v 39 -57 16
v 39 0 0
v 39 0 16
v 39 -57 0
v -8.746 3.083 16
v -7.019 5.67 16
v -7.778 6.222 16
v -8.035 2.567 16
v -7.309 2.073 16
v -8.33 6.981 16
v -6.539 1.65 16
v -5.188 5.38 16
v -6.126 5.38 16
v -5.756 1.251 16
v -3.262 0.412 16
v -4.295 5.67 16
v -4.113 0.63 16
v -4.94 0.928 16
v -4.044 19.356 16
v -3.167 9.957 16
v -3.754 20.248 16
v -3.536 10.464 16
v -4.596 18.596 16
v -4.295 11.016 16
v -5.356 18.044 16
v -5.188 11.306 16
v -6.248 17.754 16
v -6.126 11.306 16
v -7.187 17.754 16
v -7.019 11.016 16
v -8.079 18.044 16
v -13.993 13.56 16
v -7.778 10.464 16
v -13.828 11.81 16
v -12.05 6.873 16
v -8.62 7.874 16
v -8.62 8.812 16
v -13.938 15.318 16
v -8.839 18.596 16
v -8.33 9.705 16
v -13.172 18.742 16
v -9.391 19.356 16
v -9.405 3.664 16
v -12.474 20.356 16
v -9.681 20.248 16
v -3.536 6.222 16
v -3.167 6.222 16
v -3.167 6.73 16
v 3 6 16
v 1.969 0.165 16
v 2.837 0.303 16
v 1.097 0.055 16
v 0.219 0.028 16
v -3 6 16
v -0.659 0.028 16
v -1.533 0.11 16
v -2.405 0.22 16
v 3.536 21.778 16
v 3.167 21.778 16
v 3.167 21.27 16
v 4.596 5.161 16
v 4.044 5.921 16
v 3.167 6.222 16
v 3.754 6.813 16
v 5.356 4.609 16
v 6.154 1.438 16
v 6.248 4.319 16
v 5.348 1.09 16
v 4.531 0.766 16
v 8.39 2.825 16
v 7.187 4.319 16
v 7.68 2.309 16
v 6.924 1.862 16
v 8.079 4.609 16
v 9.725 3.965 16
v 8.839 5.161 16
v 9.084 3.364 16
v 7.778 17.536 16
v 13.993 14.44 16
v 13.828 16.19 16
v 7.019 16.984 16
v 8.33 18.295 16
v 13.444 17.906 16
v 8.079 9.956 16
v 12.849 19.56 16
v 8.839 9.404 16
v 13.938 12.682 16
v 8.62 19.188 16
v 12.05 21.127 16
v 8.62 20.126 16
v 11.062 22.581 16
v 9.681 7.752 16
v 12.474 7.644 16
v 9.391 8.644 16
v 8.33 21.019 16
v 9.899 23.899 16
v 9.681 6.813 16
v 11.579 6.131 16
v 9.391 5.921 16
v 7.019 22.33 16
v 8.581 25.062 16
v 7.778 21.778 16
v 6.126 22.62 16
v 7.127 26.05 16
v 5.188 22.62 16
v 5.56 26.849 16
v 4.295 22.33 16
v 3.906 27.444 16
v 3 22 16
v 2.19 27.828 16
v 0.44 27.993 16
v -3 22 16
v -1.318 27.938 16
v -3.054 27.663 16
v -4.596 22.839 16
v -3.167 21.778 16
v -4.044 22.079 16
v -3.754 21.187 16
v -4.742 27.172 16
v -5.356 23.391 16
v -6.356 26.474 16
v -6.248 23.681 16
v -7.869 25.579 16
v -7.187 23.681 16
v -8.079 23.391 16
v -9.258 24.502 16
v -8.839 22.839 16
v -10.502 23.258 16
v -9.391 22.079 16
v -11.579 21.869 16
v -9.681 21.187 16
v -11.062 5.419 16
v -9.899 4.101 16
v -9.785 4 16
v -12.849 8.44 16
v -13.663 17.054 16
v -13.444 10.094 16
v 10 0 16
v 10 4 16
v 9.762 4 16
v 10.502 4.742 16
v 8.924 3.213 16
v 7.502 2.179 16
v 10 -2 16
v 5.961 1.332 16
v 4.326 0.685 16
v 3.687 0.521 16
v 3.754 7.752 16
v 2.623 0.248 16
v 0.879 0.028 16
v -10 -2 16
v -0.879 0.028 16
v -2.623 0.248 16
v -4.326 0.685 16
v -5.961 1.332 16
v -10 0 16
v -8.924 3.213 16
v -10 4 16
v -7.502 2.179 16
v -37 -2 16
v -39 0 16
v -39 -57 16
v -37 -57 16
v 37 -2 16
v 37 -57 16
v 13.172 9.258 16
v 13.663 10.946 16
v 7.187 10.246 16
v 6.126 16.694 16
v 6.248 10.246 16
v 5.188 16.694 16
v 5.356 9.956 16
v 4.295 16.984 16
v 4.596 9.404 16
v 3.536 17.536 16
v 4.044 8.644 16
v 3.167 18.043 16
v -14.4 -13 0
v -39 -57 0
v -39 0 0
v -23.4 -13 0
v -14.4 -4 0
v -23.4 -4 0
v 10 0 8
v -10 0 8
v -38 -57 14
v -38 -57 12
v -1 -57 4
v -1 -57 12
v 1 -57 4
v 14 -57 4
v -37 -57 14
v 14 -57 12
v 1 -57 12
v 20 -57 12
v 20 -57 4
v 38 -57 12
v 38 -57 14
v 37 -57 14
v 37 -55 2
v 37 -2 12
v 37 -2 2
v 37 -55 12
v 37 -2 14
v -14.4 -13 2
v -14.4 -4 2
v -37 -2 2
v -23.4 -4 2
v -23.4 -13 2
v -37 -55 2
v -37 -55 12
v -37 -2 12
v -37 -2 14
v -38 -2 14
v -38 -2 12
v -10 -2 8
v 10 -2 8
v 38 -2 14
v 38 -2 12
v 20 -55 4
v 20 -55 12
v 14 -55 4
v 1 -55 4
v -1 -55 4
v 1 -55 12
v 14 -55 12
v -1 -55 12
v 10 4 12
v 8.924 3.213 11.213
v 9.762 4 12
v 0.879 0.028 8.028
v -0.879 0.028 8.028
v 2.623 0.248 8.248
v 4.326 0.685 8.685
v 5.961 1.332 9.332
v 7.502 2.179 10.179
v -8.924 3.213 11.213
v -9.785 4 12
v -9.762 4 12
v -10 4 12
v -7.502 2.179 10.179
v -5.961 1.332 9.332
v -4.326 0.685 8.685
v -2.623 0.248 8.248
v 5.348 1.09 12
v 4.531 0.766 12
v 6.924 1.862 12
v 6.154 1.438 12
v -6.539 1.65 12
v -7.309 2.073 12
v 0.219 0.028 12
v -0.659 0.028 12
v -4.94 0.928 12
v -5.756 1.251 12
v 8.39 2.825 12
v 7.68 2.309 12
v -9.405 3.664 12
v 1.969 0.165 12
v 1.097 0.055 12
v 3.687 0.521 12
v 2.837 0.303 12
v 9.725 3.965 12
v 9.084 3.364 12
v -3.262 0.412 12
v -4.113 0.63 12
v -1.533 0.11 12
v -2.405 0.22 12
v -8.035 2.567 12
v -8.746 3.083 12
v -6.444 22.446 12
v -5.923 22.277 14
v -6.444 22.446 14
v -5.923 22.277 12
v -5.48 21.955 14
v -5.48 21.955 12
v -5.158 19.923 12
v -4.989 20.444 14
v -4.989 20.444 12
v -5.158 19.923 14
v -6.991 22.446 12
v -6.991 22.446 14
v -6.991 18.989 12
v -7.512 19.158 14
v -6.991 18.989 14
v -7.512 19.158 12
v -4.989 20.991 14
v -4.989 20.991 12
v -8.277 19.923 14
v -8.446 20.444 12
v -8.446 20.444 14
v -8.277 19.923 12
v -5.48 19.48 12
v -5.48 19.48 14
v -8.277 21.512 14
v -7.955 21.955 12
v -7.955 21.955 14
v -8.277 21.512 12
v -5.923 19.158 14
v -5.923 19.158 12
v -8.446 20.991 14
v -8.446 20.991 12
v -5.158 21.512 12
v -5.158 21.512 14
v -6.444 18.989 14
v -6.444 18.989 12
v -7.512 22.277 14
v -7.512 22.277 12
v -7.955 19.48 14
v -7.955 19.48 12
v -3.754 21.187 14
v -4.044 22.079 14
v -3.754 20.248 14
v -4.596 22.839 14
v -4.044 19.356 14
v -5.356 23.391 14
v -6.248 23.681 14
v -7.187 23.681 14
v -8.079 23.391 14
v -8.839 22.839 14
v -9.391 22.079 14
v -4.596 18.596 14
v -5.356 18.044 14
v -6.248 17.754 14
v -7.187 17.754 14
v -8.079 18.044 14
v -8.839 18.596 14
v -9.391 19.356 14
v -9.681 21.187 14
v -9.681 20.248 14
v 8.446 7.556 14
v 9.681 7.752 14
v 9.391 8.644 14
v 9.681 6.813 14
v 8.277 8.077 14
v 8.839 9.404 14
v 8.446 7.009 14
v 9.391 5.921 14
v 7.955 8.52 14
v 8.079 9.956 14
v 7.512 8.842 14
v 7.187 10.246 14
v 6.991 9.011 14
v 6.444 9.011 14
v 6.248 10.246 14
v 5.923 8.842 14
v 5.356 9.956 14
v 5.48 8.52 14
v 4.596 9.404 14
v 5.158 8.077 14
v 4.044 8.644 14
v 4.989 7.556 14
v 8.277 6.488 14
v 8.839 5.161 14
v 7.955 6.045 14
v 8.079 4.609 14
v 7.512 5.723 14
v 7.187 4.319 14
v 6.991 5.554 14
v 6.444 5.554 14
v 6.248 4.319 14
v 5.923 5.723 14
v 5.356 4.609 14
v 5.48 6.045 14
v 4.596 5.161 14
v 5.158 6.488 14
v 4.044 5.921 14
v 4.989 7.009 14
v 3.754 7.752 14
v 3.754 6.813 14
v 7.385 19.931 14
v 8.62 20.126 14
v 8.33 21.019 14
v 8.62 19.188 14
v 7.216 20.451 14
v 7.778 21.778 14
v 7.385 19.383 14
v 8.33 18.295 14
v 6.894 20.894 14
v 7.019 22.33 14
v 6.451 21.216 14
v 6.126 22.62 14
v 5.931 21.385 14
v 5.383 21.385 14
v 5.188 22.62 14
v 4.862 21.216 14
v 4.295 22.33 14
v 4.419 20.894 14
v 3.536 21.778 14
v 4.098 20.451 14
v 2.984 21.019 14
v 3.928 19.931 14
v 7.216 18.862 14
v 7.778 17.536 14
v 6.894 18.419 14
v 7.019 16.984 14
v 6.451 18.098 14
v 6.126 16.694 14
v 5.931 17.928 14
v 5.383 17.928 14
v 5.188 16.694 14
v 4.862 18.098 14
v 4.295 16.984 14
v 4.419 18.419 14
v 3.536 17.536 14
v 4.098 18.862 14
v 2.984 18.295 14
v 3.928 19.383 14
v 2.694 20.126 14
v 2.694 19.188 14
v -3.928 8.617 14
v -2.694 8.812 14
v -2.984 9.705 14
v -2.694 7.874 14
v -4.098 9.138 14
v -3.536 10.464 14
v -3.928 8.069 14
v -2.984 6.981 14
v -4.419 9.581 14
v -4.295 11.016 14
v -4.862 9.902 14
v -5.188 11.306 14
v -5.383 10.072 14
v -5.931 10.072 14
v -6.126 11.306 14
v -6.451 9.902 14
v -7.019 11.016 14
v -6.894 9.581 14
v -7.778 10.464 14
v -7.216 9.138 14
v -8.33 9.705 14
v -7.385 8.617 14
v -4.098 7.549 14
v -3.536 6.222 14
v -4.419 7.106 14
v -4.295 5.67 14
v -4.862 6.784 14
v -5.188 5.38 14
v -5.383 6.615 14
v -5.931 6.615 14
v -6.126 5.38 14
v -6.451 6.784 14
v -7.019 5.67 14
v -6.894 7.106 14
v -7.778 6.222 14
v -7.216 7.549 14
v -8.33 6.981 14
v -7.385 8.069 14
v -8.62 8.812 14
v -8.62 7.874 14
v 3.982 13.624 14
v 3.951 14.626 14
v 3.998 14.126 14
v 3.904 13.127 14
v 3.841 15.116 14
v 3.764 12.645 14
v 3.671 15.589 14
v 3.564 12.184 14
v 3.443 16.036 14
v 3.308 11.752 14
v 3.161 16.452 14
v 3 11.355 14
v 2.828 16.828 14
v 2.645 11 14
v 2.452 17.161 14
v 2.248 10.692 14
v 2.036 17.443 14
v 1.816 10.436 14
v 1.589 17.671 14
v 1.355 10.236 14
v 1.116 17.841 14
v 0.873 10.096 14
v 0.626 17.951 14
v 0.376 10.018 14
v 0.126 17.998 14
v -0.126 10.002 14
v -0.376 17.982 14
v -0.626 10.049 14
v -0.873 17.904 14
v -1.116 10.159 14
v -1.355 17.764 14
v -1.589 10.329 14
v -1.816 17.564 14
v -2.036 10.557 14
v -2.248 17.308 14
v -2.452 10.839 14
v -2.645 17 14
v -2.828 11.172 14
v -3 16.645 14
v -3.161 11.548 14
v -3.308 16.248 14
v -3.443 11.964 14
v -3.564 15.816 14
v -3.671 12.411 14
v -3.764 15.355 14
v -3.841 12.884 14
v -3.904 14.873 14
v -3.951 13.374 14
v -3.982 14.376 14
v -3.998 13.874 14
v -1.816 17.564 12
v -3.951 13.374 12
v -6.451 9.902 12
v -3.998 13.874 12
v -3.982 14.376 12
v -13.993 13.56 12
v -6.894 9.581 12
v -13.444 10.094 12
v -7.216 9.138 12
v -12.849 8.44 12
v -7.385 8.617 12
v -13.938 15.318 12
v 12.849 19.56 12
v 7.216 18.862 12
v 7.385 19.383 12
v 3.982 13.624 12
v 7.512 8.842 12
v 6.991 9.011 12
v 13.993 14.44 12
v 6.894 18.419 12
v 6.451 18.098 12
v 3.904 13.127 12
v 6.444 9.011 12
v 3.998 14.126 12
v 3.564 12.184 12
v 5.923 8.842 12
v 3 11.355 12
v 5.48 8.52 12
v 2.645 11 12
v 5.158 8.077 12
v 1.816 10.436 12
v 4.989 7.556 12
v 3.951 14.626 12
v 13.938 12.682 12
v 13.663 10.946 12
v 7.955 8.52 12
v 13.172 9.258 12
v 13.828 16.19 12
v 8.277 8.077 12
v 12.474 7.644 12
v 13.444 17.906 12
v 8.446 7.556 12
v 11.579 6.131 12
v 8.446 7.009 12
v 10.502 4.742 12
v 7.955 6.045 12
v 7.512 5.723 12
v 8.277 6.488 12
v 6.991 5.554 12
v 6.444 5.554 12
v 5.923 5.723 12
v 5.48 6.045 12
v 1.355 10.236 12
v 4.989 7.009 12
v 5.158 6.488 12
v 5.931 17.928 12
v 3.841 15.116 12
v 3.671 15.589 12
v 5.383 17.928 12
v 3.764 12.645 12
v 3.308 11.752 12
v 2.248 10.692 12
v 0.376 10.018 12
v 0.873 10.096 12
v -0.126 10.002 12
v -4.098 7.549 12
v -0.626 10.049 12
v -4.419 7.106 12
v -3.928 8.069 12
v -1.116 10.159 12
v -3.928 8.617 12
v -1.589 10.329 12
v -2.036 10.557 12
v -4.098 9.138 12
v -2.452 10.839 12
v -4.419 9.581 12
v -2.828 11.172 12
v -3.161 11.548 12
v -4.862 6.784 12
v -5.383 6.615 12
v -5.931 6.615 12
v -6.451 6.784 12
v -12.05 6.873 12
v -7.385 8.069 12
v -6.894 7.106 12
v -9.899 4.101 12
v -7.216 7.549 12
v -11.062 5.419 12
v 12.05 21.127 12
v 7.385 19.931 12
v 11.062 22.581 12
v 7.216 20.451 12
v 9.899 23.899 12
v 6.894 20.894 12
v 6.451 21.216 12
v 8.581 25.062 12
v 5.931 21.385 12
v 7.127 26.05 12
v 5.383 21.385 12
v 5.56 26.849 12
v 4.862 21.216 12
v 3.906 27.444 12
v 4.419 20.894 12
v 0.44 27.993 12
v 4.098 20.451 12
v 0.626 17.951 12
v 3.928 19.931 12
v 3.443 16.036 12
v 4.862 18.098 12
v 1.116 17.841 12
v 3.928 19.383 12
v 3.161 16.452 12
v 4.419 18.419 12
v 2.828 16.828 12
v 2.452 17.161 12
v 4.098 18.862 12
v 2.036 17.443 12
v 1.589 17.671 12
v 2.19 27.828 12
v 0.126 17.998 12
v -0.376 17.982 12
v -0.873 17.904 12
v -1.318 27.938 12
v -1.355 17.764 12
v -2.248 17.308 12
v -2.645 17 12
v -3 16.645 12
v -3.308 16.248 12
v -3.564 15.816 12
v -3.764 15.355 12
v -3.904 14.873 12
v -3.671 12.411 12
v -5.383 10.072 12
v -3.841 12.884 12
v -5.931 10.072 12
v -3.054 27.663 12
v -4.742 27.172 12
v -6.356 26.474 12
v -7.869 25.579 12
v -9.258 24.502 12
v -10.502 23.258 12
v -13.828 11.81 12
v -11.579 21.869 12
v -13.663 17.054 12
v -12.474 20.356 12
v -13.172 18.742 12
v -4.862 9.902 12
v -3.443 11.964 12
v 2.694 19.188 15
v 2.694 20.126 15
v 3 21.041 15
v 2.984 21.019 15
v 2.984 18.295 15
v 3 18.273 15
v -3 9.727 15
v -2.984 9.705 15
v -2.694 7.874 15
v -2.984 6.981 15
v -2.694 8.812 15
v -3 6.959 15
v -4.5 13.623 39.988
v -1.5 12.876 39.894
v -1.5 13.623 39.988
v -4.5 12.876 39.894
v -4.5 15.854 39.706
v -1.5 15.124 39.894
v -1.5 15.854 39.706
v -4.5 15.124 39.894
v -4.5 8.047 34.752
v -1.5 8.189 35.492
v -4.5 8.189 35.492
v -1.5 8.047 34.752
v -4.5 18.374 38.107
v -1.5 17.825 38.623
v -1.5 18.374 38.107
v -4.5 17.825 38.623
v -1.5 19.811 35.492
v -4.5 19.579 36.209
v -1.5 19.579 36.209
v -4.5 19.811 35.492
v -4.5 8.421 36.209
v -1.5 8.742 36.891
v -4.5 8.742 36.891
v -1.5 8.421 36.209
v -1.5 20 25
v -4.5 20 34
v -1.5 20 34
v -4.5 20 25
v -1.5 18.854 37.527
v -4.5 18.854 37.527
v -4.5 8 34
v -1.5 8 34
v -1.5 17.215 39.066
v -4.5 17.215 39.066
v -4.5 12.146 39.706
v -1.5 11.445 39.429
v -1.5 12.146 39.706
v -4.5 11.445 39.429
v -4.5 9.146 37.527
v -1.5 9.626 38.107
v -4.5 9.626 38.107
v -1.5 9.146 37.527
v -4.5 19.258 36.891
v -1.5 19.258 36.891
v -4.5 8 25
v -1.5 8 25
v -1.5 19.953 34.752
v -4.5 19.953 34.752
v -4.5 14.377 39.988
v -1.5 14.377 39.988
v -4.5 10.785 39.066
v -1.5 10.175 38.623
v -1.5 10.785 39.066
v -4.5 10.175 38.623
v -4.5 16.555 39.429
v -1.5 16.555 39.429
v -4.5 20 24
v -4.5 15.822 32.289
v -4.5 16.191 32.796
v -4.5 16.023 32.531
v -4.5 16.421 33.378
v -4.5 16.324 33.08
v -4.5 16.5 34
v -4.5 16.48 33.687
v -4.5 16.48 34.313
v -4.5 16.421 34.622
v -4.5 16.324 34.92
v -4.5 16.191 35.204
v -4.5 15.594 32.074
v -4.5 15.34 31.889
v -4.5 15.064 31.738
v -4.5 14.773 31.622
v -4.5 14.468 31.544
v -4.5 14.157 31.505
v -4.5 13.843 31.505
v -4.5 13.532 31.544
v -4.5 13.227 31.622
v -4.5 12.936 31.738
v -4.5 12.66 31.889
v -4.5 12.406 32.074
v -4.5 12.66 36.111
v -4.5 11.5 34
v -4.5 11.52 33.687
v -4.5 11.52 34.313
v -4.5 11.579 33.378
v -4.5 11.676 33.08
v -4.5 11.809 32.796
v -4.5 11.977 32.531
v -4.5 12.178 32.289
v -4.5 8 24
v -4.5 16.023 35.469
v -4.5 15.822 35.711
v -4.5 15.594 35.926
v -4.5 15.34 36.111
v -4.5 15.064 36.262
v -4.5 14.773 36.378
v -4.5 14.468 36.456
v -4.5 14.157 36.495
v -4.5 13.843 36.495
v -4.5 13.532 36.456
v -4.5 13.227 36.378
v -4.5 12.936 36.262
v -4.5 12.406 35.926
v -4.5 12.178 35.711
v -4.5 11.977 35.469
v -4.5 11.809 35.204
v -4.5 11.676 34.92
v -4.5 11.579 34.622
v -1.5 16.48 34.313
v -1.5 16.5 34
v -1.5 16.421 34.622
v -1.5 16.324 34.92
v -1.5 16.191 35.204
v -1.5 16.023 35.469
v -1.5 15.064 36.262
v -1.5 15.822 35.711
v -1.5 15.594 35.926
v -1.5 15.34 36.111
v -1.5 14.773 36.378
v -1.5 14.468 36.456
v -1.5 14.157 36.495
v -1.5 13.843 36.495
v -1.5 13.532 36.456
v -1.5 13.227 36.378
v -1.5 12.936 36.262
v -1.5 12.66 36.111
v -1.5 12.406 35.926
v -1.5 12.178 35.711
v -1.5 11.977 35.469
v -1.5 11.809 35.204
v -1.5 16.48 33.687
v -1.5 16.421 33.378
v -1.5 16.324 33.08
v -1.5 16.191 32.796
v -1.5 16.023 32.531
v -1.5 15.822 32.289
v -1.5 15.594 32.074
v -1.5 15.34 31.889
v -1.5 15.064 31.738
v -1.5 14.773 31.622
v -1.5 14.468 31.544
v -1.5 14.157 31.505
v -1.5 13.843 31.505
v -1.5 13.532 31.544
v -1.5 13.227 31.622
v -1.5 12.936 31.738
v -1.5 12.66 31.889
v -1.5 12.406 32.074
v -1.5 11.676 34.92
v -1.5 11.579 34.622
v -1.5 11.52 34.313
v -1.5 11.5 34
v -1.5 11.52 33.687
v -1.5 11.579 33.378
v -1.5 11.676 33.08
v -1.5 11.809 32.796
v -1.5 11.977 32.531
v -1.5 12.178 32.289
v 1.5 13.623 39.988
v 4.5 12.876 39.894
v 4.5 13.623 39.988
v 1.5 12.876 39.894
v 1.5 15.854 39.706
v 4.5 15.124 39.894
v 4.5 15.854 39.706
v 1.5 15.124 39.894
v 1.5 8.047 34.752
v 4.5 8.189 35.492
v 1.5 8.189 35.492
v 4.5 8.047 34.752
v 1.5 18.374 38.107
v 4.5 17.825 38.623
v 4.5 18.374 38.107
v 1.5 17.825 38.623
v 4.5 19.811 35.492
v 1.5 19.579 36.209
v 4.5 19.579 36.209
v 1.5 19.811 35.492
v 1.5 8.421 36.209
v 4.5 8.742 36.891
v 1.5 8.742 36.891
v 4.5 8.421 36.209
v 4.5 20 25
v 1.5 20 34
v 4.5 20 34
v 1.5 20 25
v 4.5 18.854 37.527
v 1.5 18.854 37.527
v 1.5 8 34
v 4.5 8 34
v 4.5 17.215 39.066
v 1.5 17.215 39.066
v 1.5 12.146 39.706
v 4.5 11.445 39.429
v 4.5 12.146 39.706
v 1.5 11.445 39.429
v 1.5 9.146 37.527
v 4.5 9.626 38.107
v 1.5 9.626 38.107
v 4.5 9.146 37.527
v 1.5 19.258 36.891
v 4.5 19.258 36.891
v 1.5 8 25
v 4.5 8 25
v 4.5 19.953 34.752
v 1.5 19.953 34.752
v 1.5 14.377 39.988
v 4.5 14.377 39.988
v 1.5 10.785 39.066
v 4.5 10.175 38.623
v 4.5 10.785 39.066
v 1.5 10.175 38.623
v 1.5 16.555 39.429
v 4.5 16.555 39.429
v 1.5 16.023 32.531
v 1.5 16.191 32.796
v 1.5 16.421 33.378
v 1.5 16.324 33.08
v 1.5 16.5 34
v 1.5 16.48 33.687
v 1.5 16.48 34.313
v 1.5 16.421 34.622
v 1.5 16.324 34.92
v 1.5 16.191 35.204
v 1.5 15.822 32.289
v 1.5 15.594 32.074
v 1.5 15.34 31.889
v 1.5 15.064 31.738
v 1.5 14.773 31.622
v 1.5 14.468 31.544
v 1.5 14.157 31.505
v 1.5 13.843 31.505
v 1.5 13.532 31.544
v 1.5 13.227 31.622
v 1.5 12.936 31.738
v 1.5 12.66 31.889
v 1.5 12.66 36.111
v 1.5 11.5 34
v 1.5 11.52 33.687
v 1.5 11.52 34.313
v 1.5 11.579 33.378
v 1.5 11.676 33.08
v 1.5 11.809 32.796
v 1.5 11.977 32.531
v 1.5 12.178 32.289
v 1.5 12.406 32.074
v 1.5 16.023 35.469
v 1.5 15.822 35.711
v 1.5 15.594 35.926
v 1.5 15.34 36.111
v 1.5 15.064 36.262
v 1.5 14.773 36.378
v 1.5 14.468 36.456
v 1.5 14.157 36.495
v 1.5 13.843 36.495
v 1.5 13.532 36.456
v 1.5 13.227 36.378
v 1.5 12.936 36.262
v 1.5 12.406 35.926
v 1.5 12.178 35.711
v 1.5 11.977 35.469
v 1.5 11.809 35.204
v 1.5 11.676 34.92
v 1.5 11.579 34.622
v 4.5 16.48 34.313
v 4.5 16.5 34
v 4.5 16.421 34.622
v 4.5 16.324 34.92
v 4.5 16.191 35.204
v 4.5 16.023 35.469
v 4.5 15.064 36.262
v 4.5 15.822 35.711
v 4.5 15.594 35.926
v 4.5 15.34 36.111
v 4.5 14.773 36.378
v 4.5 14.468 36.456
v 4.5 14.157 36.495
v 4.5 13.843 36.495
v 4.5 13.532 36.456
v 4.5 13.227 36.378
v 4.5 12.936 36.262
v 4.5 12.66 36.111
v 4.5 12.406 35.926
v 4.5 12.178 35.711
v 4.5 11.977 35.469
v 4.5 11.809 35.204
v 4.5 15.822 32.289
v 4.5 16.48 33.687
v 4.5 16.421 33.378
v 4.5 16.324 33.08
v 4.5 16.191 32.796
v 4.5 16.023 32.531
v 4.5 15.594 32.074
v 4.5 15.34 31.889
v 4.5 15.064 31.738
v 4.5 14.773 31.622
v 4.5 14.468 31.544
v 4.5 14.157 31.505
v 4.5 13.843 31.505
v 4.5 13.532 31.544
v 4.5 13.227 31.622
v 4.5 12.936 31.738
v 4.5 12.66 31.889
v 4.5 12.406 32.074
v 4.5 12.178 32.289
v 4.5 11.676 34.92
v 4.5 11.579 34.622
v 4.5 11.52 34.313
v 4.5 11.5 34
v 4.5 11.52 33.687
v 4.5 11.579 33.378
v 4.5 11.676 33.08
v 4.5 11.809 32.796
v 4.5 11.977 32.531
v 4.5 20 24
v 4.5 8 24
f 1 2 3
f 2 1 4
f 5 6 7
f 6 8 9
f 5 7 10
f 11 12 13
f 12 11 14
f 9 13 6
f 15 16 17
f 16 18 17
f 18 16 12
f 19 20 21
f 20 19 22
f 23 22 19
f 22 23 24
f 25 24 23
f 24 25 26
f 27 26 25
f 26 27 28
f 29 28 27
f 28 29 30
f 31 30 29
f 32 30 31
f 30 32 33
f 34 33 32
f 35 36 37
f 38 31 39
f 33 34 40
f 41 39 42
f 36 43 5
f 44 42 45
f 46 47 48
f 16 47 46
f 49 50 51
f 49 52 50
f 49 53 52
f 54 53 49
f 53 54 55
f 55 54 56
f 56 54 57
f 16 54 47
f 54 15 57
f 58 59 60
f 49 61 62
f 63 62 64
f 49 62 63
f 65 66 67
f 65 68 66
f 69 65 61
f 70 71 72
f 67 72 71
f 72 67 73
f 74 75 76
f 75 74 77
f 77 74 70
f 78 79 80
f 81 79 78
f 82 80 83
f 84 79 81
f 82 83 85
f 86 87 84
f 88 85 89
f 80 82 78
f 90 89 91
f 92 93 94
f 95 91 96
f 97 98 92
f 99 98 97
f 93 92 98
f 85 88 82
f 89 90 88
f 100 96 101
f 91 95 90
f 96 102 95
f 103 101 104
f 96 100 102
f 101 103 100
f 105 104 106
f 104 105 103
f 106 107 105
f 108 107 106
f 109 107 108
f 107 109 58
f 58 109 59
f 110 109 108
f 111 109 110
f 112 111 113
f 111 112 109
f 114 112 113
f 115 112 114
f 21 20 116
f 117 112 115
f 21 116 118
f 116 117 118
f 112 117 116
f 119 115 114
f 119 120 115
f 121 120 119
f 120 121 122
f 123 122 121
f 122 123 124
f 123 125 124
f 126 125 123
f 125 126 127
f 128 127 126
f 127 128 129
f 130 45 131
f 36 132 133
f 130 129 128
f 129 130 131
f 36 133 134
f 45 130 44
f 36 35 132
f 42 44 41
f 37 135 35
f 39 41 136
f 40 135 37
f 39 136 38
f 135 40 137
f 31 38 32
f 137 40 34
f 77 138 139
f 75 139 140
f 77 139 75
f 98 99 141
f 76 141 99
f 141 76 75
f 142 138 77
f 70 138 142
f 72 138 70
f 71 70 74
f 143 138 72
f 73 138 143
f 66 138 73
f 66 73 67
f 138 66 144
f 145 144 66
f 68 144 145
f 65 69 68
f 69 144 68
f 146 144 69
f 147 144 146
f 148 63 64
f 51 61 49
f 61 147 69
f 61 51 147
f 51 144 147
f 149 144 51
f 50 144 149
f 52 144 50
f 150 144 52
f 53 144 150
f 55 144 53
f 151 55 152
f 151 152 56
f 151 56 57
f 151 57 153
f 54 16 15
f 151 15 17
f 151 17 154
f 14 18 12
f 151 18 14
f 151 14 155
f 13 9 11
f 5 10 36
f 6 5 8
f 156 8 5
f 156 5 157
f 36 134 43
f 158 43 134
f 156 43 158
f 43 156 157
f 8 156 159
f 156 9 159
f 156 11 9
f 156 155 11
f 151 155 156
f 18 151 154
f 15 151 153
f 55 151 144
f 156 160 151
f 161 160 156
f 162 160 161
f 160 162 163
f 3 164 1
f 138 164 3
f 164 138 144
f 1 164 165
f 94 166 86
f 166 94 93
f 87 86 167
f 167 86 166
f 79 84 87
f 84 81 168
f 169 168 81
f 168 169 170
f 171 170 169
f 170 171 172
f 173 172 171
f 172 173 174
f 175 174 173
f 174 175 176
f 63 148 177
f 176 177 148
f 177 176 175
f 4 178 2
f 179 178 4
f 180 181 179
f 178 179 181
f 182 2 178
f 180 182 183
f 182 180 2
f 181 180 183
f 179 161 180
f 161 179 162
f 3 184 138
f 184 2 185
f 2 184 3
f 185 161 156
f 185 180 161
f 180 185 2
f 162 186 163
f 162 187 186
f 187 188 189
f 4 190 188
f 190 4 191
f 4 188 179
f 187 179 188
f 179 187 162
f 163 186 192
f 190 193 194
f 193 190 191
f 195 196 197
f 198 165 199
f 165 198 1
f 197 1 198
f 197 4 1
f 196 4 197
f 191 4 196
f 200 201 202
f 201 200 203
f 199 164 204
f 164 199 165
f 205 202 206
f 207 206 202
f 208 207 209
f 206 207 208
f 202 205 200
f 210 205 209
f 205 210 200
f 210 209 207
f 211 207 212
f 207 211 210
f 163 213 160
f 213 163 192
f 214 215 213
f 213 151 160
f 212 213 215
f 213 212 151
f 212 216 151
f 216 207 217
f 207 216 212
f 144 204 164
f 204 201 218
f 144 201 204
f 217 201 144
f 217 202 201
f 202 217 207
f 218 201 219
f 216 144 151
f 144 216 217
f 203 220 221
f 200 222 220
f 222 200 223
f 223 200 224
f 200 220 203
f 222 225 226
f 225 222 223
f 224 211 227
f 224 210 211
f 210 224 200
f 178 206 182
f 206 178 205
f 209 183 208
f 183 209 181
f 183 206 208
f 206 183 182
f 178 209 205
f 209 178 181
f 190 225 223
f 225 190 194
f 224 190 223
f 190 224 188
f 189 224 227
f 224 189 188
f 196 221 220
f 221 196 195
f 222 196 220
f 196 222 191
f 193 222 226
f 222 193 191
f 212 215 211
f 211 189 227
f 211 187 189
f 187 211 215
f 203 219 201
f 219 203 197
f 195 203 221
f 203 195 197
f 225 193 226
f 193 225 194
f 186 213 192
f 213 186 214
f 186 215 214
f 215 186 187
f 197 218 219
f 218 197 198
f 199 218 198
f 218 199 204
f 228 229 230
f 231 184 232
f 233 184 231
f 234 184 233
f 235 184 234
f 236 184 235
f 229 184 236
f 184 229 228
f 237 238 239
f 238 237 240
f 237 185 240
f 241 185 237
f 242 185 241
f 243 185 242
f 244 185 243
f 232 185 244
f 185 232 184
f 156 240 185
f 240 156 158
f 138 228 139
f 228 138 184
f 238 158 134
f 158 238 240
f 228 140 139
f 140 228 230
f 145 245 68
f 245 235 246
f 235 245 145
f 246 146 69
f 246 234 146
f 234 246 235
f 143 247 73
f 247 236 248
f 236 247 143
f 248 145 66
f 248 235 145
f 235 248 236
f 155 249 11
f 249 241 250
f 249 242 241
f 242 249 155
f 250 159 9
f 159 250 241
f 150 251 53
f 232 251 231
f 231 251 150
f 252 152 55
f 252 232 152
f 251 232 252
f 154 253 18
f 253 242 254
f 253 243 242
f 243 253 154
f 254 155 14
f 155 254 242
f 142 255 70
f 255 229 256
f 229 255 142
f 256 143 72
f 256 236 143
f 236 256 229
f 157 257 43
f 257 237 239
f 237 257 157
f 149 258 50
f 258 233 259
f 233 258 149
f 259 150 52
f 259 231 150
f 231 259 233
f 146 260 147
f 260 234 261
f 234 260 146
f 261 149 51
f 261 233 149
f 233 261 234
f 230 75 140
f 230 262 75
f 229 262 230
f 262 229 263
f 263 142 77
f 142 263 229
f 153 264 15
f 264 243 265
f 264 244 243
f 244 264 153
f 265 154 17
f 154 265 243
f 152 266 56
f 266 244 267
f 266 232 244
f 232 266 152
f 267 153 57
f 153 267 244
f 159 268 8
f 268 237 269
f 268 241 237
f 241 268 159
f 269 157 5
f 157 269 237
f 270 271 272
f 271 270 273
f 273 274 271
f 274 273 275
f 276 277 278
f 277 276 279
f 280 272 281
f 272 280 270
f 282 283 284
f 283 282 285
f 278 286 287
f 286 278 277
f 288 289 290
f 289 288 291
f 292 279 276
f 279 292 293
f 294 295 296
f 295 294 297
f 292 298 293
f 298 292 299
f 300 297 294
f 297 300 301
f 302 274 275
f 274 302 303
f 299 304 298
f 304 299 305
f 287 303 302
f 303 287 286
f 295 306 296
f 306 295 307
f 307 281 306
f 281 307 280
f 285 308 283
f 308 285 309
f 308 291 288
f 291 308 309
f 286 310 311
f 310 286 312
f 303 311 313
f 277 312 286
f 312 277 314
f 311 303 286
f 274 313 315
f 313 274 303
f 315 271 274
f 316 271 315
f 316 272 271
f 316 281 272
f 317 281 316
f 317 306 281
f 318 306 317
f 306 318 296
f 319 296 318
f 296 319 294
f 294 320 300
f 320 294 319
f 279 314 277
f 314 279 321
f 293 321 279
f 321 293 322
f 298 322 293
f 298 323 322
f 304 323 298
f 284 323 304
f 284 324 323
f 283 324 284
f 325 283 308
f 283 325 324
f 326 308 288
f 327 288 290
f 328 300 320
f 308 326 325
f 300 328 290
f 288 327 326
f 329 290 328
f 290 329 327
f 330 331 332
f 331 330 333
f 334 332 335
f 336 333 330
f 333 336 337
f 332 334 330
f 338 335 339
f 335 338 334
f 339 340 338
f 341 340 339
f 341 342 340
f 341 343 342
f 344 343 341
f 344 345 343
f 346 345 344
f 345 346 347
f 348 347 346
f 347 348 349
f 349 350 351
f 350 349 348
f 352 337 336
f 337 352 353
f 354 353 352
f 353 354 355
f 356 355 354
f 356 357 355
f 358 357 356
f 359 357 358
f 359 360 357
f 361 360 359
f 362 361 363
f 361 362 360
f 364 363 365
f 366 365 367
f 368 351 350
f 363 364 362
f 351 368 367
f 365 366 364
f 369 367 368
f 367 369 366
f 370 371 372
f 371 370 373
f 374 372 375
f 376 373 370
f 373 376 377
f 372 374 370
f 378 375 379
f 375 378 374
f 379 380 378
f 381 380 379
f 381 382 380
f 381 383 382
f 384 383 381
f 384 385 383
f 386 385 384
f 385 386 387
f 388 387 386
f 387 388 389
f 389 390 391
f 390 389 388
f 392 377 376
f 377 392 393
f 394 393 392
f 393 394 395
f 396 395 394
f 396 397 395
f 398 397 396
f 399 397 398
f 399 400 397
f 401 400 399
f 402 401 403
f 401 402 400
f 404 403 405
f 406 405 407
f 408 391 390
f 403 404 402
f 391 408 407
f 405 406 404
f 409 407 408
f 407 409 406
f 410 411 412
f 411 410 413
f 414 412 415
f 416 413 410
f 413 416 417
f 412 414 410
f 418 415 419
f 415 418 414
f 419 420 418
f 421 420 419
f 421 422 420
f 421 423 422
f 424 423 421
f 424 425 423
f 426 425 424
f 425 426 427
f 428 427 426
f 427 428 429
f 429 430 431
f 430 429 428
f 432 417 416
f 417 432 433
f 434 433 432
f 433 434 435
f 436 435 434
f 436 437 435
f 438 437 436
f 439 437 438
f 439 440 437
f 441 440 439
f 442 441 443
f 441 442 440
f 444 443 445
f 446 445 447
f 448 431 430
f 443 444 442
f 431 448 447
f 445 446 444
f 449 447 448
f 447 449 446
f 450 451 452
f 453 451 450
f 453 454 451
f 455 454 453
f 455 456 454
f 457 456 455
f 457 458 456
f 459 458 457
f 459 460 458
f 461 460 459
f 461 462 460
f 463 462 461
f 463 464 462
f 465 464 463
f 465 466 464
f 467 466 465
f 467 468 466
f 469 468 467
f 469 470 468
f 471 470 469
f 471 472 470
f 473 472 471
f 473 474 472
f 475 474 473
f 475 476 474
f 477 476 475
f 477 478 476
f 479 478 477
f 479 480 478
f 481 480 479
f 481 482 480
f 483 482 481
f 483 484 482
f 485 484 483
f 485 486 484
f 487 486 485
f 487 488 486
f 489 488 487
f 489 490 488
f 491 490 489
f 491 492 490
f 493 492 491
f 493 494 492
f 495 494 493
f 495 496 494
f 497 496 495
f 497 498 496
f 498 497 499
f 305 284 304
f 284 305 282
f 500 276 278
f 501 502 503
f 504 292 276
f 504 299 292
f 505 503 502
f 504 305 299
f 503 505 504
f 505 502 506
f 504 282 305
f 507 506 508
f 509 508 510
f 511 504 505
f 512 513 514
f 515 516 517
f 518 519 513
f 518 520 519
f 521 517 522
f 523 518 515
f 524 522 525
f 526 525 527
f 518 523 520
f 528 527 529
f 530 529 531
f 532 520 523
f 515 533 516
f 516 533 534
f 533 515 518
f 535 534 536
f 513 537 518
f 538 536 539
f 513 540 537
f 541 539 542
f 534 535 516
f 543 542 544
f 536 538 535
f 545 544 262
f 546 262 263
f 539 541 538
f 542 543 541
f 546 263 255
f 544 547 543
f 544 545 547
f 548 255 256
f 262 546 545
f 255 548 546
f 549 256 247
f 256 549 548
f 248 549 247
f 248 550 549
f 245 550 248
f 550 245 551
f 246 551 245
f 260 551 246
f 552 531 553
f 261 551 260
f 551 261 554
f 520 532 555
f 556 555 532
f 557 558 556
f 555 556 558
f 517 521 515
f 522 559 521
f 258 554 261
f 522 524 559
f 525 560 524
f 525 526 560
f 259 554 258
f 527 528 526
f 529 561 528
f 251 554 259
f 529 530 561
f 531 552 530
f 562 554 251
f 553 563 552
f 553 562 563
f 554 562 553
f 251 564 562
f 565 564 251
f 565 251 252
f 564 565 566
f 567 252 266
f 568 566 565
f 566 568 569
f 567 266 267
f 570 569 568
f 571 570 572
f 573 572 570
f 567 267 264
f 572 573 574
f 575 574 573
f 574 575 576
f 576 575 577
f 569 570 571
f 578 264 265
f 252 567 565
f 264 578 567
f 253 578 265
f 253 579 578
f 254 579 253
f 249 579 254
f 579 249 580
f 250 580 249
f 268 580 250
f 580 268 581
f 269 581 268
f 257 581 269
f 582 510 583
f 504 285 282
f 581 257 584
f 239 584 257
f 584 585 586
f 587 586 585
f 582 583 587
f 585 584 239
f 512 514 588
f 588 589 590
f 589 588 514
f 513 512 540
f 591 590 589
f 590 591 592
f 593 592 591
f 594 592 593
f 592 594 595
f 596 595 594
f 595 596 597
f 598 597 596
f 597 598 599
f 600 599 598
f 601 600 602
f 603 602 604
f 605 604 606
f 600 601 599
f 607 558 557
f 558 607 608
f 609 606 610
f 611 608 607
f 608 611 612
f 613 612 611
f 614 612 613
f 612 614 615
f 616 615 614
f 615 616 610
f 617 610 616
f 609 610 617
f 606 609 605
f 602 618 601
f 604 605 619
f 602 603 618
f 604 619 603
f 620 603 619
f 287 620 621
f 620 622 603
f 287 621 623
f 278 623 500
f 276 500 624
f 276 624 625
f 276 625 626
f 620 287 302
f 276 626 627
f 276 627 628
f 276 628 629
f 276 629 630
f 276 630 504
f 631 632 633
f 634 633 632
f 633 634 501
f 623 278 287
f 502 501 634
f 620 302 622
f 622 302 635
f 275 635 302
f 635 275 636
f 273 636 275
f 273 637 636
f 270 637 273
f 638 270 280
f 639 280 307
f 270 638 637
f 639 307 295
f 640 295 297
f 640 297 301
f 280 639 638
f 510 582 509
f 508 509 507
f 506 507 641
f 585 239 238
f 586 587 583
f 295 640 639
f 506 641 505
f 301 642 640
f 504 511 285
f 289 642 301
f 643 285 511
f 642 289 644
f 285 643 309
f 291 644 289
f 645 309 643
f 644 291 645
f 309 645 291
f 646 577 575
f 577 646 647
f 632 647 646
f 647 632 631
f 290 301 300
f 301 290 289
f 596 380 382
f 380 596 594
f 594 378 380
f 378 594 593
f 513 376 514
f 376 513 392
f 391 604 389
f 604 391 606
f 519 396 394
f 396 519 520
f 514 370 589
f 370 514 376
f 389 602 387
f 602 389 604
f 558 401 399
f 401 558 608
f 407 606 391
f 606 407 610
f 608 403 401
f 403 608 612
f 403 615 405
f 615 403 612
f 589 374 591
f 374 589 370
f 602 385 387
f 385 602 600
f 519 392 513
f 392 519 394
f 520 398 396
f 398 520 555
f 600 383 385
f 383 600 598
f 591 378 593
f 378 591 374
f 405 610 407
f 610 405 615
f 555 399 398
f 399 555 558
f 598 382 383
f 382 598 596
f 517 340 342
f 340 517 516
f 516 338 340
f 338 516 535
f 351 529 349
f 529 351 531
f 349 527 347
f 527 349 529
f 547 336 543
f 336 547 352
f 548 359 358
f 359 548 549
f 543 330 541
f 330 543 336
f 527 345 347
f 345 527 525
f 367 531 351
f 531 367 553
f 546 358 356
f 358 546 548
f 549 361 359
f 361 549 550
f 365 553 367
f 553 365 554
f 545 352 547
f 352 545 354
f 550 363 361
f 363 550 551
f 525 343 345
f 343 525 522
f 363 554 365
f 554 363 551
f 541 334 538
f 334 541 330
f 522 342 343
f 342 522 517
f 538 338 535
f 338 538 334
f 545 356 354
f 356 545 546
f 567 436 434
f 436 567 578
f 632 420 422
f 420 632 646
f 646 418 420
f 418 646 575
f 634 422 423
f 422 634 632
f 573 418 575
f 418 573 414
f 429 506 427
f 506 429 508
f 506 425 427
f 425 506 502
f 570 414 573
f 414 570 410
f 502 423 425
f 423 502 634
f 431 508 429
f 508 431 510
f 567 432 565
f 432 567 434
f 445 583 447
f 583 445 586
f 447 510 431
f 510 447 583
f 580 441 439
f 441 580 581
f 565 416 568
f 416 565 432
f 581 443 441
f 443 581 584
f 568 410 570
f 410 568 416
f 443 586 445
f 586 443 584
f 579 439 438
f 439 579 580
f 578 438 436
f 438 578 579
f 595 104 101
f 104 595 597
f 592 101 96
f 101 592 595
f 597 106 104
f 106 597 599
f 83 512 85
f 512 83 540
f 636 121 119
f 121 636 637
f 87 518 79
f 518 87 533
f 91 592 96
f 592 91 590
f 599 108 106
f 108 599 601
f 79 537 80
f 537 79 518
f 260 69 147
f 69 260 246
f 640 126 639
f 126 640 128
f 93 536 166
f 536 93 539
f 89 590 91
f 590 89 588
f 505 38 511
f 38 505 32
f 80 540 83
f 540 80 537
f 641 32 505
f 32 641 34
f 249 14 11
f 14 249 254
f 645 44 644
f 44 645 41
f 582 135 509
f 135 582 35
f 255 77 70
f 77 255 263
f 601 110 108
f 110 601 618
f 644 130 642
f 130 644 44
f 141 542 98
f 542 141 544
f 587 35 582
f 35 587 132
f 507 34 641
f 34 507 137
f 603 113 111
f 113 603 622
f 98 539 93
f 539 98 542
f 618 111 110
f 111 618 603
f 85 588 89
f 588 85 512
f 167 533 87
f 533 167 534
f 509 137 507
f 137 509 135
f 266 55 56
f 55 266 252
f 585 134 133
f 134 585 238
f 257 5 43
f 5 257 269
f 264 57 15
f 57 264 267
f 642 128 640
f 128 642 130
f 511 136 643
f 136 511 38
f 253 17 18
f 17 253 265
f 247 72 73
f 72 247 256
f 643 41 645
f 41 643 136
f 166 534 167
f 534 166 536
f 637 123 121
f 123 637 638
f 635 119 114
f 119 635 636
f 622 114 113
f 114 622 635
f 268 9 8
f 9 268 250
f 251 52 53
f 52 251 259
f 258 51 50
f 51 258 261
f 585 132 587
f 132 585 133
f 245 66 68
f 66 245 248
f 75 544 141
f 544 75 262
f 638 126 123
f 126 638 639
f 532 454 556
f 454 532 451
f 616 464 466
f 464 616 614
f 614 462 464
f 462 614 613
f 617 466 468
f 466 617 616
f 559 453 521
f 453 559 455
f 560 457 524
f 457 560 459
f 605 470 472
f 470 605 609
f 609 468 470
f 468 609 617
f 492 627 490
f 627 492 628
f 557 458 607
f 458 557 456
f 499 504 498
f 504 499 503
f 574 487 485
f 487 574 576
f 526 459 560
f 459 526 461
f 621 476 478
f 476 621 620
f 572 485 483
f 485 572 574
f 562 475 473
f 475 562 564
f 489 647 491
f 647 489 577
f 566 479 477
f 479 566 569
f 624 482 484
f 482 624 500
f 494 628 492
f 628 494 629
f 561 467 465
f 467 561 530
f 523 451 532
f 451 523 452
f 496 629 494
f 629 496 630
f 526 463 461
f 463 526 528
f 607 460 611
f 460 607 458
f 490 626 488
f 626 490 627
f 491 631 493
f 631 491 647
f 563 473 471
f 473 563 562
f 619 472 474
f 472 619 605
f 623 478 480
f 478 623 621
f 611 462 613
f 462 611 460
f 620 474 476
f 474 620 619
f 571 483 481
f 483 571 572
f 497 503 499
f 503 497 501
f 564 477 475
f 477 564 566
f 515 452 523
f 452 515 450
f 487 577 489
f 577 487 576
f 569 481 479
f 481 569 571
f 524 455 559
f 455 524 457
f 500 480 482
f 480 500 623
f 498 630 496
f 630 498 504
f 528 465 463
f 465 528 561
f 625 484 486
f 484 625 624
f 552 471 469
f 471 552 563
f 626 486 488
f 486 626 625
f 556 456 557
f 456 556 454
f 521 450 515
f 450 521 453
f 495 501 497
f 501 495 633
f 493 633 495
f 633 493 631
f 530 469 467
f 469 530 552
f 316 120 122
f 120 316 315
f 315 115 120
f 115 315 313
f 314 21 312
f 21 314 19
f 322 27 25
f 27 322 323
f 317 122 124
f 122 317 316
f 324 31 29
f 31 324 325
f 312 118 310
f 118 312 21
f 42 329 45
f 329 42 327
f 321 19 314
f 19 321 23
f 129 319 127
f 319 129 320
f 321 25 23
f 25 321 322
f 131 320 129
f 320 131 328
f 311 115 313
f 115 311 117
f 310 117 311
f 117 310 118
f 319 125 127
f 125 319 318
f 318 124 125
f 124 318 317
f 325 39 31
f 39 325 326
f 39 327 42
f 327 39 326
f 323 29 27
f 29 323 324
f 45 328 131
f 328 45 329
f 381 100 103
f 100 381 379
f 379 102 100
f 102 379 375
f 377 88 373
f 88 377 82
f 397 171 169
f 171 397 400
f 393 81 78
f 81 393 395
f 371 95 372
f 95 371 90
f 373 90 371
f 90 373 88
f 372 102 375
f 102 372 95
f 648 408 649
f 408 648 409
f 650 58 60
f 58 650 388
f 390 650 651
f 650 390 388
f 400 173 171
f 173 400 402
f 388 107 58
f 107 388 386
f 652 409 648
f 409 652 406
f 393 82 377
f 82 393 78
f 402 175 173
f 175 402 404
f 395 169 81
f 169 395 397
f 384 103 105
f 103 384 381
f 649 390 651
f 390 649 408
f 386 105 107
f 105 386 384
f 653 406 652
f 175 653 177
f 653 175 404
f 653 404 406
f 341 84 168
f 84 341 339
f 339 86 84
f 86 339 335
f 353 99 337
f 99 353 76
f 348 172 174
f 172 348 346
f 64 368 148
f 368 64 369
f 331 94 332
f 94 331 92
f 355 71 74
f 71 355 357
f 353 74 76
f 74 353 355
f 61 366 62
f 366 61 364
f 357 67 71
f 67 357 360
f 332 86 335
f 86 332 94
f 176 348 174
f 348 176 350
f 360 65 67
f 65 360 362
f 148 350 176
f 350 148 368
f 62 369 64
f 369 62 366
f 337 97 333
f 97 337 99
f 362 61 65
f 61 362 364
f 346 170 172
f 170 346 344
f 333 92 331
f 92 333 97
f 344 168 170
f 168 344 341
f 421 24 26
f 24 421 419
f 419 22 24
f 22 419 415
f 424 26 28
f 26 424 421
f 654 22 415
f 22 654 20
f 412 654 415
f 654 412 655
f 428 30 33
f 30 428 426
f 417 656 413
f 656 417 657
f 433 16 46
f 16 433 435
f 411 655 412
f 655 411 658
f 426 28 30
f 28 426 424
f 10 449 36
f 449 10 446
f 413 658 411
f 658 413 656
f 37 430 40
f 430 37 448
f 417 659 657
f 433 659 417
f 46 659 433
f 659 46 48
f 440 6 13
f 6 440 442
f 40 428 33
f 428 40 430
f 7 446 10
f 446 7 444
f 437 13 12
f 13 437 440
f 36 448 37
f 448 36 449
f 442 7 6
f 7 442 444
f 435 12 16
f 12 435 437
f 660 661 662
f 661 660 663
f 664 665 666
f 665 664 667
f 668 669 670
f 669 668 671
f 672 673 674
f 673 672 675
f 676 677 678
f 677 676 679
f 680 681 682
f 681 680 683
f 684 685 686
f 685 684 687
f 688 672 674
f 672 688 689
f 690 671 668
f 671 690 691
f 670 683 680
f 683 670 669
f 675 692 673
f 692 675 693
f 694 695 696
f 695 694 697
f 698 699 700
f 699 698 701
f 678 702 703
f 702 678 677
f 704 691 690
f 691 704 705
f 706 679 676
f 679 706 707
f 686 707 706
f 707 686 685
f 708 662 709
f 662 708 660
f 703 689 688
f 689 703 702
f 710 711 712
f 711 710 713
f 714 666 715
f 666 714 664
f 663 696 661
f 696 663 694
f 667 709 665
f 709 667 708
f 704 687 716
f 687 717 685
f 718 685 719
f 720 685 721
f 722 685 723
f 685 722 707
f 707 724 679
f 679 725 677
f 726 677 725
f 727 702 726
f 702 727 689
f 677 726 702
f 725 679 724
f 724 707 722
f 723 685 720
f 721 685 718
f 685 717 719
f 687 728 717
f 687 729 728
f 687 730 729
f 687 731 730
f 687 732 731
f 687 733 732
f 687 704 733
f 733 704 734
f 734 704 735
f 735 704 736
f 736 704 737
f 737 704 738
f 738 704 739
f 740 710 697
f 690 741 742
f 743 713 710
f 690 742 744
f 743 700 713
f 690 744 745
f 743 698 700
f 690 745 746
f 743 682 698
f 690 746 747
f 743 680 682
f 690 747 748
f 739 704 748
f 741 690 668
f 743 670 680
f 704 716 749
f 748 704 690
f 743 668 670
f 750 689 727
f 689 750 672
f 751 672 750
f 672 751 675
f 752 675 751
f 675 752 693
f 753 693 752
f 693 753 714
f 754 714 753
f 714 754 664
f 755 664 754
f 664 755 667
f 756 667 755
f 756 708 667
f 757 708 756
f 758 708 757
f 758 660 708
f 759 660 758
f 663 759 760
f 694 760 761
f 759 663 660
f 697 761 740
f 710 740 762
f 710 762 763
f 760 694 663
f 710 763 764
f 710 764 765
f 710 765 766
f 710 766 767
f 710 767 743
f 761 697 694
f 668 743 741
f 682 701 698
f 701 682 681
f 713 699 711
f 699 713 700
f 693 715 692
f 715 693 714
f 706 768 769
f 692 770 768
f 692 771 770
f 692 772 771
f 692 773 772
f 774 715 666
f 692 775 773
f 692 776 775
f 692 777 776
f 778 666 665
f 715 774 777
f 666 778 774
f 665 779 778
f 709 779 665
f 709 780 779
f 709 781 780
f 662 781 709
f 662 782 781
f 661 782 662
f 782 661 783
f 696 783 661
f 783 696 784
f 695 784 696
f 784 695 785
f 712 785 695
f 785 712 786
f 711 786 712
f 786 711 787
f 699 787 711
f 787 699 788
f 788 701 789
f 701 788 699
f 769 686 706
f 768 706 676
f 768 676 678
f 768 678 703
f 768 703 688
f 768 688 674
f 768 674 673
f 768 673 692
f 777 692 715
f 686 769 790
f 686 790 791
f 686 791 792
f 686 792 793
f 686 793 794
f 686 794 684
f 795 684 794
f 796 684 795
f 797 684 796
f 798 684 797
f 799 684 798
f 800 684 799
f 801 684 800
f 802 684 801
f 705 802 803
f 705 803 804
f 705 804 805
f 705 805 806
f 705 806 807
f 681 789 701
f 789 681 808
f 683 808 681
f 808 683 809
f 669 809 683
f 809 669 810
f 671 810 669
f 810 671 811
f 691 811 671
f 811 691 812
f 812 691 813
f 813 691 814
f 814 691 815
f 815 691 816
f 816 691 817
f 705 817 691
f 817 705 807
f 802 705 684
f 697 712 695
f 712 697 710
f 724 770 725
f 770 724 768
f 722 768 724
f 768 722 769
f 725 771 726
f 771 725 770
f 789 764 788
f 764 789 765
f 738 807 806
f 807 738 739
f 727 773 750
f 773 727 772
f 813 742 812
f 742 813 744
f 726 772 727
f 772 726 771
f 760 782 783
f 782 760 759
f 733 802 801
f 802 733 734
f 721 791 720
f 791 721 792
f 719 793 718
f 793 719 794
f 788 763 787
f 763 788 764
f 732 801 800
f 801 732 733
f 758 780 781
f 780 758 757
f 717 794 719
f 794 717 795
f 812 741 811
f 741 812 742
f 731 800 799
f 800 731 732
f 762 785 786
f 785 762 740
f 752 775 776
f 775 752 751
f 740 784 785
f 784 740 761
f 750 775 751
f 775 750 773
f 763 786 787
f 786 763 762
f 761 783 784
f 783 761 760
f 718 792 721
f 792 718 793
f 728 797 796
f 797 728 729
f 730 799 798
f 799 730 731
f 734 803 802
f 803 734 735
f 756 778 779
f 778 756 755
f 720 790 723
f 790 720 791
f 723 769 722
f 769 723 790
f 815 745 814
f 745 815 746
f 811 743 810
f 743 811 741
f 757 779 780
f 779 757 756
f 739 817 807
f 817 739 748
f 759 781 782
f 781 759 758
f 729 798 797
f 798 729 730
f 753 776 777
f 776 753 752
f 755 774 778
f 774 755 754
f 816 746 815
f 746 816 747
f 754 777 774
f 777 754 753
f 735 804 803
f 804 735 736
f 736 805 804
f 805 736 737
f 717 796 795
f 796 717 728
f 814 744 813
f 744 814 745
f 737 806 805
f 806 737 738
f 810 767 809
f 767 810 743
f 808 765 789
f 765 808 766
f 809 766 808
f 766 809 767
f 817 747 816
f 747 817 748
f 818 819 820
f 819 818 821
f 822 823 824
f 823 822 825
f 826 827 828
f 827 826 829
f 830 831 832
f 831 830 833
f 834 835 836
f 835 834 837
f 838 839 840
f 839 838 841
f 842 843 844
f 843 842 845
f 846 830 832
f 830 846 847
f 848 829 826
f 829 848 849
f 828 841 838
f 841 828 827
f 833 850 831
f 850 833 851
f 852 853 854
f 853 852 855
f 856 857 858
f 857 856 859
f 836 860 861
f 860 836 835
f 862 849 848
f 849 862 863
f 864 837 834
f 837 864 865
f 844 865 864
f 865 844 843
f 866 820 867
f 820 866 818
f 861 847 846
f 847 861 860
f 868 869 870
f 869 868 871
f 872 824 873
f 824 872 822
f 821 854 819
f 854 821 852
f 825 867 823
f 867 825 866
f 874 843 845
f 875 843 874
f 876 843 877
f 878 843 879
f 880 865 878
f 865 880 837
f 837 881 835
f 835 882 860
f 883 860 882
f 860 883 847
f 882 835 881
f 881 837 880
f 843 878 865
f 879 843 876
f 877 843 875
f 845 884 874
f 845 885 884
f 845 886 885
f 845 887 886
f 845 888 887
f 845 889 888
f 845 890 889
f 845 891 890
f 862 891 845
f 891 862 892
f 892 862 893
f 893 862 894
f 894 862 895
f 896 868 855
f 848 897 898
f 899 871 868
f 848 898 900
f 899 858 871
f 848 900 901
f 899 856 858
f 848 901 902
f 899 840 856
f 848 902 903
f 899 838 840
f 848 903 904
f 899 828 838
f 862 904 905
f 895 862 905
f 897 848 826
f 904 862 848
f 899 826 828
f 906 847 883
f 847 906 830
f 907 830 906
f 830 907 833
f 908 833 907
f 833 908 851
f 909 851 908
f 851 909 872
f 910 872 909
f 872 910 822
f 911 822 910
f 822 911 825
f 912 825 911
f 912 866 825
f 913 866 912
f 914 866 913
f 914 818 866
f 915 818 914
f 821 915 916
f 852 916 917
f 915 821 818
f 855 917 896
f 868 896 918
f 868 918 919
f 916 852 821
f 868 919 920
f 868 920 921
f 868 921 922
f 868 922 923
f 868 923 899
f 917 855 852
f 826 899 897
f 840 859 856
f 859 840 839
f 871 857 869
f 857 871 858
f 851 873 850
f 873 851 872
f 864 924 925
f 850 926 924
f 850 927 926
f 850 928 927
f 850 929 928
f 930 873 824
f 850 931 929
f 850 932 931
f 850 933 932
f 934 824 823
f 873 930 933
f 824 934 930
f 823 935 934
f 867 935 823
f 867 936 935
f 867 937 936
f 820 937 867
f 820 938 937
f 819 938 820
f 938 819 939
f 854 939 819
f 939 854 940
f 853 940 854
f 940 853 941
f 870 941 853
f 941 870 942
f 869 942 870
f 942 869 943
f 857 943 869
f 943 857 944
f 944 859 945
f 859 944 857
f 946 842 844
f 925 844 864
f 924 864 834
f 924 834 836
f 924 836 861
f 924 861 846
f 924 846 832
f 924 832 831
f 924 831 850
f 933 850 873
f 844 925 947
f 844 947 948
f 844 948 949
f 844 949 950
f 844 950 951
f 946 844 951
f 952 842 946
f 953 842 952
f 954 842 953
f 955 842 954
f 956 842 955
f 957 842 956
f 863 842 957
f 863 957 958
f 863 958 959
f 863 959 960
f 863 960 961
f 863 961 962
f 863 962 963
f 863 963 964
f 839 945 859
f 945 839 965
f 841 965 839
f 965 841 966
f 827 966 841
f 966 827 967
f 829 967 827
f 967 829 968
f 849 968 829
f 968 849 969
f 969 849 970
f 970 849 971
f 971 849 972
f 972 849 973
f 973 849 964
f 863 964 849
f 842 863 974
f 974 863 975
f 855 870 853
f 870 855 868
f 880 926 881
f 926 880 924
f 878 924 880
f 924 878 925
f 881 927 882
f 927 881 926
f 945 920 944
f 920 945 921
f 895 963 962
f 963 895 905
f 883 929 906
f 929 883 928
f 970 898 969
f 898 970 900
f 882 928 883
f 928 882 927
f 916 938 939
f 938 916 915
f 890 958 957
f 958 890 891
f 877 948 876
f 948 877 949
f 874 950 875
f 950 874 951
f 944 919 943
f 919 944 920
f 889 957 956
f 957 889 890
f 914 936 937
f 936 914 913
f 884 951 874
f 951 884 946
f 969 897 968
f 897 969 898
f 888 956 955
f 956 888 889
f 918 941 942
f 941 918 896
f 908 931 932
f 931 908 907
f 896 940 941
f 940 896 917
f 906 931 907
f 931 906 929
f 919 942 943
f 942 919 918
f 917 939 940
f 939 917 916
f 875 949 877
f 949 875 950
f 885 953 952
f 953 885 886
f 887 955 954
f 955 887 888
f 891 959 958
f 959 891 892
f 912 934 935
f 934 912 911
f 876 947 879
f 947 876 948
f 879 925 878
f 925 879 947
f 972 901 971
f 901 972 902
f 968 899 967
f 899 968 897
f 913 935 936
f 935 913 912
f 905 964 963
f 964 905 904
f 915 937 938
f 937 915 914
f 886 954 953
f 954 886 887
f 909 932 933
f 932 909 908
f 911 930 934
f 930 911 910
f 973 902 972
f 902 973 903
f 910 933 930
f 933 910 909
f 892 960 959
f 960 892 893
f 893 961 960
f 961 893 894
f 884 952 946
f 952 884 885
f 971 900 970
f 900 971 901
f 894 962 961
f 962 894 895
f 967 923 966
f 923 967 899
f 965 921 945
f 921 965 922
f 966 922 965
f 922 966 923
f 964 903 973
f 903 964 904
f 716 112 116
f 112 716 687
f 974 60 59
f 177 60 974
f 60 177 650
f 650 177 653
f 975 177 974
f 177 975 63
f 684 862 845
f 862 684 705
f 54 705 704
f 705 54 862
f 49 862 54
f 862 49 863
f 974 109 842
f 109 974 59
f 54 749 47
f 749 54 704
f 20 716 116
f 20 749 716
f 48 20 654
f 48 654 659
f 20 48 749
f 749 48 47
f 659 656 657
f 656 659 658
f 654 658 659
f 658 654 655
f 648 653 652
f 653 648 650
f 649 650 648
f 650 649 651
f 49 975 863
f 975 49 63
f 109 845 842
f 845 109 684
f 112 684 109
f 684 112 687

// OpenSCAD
// ****************************************************************************
// Sizeable controller cover
// resize as required, adapt holes for cables as required
// Author: Peter Holzwarth
// ****************************************************************************

// width of the controller box in mm, including the left and right walls
boxWidth= 74+4; // [20:100]

// height of the controller box in mm, including the upper and lower walls
boxHeight= 53+4; // [20:100]

// depth of the controller box in mm
boxDepth= 16; // [10:30]

$fn=50;

// controller enclosure
translate([-boxWidth/2, -boxHeight, 0]) 
    controllerFlex([boxWidth, boxHeight, boxDepth]);

// motor plate fixture for controller
difference() {
    translate([-10, -2, 0]) hull() {
        translate([0, 0, boxDepth-4]) cube([20, 6, 4]);
        translate([0, 0, boxDepth/2]) cube([20, 2, 1]);
    }
    // space for motor
    translate([0, 14, boxDepth/2]) cylinder(r= 14, h= boxDepth/2+0.1);
}

// motor plate
translate([0,14,boxDepth-4]) rotate([0,0,45]) plate2208Back();

// action cam mount
translate([-4.5,12+14-6,boxDepth+8]) rotate([90,0,0]) 
    ActionCamMale(4, true);

// action cam fixture
hull() {
    translate([-4.5, 8,boxDepth+8]) cube([9, 12, 1]);
    translate([-3, 6,boxDepth-1]) cube([6, 16, 1]);
}


module controllerFlex(dimensions) {
    difference() {
        // outer box
        cube([dimensions[0], dimensions[1], dimensions[2]]);
        // inner space for board
        translate([2, 2, 2]) 
            cube([dimensions[0]-4, dimensions[1]-4, dimensions[2]-2+0.1]);
        // opening for cables in upper left corner
        translate([dimensions[0]/5, dimensions[1]-4-9, -0.1]) 
            cube([9, 9, 2.2]);
        // opening for cables in bottom middle
        translate([dimensions[0]/2-1, -0.1, 4]) 
            cube([2, 2.2, dimensions[2]-4]);
        // opening for joytick port right to the cable opening
        translate([dimensions[0]-23-2, -0.1, 4]) 
            cube([6, 2.2, dimensions[2]-4]);
        // opening for cap
        translate([2, -0.1, dimensions[2]-4]) 
            cube([dimensions[0]-4, 2.2, 4.1]);
        // slide-in left
        translate([1, 0, dimensions[2]-4]) 
            cube([2, dimensions[1]-2, 2]);
        // slide-in right
        translate([dimensions[0]-3, 0, dimensions[2]-4]) 
            cube([2, dimensions[1]-2, 2]);
    }
}

// create a back plate for a 2208 motor
module plate2208Back() {
    // plate inner part
    plate2208BackI(2, 1.75, false); 
    // plate outer part
    translate([0,0,2]) plate2208BackI(2, 3, true); 
}

module plate2208BackI(plateHeight, screwRadius, fillAxis) {
    difference() {
        cylinder(r= 14, h= plateHeight);
        // holes for the screws
        radialScrews([[0,9.5], [90,8], [180,9.5], [270,8]], 
                    screwRadius, plateHeight);
        if (!fillAxis) {
            // hole for the axis
            cylinder(r= 4, h= plateHeight); 
        }
    }
}

module radialScrews(screwList, screwRadius= 1, screwHeight= 1) {
    for (screw= screwList) {
        alpha= screw[0];
        c= screw[1];
        x= sin(alpha) * c;
        y= cos(alpha) * c;
        translate([x, y, 0]) 
            cylinder(r= screwRadius, h= screwHeight, $fn=20);
    }
}

// ////////////////////////////////////////////////////////////////
// Action cam connector, camera side
module ActionCamMale(l) {
    for (i= [0, 6]) {
        translate ([i, 0, 0]) ActionCamOneRing(l);
    }
}

// helper
module ActionCamOneRing(l) {
    translate([0, 0, 6]) rotate([0, 90, 0]) difference() {
        hull() {
            translate([0, 6+l, 0]) cylinder(r=6, h=3);
            translate([-6, 0, 0]) cube([12,1,3]);
        }
        translate([0, 6+l, 0]) cylinder(r=2.5, h=3);
    }
}
